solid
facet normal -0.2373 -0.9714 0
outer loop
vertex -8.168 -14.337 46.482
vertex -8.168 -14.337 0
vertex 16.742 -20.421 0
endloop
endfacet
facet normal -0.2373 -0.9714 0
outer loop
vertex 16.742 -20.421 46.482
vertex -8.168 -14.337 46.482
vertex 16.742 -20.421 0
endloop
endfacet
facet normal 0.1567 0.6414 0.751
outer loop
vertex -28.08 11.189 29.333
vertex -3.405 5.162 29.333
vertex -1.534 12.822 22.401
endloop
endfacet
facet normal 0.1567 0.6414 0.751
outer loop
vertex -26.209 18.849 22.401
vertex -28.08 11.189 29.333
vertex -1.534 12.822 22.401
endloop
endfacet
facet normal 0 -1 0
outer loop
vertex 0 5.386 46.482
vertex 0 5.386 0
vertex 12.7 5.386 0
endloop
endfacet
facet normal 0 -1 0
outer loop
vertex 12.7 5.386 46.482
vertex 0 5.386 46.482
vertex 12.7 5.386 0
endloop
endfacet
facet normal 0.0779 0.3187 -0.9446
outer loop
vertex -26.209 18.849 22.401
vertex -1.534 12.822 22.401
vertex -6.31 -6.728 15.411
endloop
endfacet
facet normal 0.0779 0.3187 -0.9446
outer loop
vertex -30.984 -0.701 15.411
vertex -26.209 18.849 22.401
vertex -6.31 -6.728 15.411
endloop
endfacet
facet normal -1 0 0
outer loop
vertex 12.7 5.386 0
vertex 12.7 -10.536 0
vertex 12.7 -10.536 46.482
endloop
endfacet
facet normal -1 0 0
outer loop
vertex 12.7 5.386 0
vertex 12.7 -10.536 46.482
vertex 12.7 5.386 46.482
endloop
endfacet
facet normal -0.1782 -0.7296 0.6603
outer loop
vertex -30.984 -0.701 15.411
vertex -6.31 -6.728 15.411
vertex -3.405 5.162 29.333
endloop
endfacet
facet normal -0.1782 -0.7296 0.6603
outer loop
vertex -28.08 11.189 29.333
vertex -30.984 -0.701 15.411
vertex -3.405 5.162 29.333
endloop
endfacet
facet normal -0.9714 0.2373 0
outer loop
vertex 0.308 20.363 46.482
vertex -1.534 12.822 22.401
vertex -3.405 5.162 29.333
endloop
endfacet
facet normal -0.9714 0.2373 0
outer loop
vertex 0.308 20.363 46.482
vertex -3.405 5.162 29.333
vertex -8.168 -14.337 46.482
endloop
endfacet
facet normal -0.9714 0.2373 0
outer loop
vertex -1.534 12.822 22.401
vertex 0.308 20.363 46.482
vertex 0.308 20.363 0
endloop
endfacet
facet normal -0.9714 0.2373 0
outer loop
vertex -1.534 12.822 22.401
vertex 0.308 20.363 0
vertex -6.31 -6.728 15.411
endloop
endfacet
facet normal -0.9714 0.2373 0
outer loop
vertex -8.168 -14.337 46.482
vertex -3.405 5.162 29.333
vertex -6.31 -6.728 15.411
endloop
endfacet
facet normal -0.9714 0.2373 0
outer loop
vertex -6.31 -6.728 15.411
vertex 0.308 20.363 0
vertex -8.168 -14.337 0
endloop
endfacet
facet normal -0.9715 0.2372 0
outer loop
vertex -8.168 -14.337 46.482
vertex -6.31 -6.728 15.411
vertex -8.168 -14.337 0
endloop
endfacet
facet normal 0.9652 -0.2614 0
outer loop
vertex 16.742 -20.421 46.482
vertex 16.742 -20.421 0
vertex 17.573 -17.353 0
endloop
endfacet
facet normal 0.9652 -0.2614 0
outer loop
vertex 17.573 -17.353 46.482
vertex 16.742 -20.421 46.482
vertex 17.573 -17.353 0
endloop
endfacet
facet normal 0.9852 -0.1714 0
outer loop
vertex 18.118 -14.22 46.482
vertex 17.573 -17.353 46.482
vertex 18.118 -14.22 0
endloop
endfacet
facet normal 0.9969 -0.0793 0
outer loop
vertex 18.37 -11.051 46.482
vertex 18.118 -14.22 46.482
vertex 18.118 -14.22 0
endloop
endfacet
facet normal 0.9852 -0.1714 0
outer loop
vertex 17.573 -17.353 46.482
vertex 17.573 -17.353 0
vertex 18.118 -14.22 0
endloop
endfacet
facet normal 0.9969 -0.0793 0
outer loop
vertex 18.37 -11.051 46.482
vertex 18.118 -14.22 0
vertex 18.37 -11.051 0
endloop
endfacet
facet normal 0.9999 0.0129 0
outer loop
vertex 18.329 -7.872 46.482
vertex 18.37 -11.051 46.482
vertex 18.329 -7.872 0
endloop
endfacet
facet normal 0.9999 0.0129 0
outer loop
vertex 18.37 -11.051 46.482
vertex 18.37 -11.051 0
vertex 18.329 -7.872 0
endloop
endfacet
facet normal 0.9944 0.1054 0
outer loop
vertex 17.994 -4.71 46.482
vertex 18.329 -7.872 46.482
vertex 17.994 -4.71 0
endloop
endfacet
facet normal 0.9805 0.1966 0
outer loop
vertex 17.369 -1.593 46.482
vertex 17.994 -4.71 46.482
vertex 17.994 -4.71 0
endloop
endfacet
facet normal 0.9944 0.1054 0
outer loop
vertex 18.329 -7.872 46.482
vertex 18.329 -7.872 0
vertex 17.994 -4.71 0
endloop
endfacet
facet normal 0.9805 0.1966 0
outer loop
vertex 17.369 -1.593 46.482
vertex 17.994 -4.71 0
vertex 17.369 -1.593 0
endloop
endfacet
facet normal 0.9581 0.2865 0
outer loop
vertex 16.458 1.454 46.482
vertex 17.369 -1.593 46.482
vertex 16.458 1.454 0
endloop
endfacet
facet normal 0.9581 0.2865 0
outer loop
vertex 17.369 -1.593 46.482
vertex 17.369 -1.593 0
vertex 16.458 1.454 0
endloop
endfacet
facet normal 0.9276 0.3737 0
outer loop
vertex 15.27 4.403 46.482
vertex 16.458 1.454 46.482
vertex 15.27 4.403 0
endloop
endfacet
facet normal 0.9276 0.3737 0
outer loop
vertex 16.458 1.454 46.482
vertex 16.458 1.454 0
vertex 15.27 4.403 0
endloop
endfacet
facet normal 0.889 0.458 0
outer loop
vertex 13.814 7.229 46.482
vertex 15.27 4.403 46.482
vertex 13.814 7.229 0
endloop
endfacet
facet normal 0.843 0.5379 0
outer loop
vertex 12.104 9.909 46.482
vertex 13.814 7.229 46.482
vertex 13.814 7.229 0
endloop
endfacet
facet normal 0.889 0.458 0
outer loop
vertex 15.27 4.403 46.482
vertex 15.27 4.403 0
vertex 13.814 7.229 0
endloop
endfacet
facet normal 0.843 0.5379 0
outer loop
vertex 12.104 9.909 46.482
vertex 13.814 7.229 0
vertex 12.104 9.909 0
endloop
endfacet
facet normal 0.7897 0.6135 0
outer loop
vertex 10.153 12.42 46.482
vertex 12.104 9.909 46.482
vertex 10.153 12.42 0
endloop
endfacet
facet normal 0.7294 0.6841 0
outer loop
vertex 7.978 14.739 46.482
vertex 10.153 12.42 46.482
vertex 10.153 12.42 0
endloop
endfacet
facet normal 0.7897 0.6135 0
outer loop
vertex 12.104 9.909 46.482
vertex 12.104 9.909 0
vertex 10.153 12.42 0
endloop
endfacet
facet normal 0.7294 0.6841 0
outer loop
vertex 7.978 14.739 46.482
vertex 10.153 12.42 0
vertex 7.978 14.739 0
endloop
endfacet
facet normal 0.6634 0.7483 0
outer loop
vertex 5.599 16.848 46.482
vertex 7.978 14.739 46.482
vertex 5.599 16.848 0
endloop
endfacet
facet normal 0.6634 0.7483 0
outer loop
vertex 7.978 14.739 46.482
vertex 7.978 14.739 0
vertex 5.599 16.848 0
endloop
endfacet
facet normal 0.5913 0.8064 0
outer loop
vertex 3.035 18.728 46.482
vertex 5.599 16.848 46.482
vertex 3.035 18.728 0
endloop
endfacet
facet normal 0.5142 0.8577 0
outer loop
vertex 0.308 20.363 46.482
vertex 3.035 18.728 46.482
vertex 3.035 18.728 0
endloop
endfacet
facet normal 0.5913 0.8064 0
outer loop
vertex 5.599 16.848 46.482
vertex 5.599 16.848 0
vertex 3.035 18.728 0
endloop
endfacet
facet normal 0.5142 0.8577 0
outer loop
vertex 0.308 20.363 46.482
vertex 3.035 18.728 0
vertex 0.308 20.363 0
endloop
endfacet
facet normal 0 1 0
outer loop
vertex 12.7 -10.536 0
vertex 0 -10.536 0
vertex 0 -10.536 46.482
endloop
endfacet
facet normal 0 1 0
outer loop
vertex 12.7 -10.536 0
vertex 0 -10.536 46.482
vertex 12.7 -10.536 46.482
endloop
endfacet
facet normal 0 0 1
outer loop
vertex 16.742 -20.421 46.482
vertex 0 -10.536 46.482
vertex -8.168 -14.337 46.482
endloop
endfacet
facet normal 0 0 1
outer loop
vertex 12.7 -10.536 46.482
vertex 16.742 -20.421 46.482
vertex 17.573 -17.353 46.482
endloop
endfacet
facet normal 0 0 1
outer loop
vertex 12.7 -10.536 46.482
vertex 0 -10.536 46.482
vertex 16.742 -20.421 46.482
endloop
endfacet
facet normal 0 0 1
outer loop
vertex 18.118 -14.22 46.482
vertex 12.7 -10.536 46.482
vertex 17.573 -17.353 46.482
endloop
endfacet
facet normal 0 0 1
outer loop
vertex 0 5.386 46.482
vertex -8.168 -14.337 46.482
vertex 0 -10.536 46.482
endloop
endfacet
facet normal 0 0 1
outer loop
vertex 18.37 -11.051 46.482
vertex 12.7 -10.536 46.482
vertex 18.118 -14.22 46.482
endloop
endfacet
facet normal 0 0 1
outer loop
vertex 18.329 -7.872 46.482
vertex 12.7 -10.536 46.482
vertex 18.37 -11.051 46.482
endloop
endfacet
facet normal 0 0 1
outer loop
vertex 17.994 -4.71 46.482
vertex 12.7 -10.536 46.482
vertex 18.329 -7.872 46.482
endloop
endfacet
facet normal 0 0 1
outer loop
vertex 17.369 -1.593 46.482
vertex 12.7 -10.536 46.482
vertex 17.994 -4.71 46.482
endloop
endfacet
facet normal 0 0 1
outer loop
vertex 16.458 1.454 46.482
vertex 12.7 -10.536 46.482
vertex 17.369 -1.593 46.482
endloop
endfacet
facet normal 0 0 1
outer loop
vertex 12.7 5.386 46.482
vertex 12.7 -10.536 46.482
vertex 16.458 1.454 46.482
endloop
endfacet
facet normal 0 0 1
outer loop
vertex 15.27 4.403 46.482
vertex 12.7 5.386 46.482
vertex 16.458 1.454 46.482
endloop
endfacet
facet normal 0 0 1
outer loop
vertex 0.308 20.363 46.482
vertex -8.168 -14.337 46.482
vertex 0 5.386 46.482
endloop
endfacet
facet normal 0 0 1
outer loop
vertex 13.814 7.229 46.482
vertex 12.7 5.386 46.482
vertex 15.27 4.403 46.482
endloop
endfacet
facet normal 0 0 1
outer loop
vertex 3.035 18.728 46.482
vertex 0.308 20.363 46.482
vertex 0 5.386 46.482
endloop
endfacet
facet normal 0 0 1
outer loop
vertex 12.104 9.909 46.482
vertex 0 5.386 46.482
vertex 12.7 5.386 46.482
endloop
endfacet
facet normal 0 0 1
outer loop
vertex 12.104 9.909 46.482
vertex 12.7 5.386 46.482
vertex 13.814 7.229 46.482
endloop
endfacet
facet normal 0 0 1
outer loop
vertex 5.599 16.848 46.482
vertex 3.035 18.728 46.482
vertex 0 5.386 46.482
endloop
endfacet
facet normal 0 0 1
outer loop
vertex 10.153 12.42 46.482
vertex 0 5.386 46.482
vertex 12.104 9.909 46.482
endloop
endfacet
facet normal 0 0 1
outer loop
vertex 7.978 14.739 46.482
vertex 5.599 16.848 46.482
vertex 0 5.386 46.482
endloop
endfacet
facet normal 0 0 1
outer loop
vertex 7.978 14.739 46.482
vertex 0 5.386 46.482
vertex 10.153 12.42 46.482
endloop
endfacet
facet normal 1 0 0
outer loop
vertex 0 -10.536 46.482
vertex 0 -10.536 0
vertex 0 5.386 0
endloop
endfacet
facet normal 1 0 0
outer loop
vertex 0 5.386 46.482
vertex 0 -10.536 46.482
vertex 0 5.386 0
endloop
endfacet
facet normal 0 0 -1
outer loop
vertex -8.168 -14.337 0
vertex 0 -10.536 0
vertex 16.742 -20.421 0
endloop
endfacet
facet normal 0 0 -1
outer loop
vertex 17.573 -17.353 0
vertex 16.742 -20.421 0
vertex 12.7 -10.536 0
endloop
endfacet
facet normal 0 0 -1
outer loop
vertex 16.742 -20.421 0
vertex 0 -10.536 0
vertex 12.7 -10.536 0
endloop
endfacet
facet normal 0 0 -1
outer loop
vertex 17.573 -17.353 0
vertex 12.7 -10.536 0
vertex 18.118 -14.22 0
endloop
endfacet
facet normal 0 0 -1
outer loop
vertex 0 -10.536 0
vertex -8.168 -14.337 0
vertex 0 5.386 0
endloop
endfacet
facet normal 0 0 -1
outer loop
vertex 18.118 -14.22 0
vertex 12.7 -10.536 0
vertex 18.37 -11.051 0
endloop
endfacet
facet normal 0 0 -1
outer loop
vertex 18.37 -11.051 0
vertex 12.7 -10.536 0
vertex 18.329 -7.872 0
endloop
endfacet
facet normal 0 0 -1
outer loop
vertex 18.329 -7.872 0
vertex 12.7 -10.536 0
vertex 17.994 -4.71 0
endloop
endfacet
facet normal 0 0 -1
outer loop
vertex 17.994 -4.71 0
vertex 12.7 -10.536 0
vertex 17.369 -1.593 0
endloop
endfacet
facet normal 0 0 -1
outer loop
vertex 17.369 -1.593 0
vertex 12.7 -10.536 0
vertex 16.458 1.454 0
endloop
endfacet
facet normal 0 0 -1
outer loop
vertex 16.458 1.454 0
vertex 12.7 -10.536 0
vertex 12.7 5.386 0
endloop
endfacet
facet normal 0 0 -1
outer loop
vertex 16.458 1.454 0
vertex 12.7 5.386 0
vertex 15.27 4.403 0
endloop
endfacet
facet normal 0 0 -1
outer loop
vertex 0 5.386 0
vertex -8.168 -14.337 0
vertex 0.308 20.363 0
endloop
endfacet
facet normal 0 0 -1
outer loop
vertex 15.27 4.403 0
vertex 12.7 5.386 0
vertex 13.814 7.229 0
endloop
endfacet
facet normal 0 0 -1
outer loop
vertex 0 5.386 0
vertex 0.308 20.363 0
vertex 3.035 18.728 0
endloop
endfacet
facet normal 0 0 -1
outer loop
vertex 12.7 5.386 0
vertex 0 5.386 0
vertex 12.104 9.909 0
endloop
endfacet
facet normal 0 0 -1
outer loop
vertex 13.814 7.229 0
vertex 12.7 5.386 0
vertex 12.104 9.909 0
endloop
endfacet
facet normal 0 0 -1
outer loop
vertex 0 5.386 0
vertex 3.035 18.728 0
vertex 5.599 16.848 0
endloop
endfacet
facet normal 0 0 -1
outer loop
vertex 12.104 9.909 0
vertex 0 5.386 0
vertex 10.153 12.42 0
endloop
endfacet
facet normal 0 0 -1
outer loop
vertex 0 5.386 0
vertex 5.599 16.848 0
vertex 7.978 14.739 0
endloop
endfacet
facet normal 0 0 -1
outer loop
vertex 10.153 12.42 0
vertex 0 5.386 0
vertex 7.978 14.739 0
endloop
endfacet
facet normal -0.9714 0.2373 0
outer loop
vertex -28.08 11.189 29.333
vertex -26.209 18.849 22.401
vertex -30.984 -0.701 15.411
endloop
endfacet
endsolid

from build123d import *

# Parameters (mm, degrees)
F0_W     = 12.7
F0_H     = 15.9213780425
F1_DEPTH = 46.482
F3_DEPTH = 25.4


with BuildPart() as f1:
    # F0 (on Top) → F1 (new body)
    with BuildSketch(Plane.XY):
        with BuildLine():
            ThreePointArc((16.7416256447, -20.4212910858), (15.8982302722, 2.9417746338), (0.3078590999, 20.3625806509))
            Line((0.3078590999, 20.3625806509), (-8.168171327, -14.3365160608))
            Line((-8.168171327, -14.3365160608), (16.7416256447, -20.4212910858))
        make_face()
        with Locations((6.35, -2.5750233326)):
            Rectangle(F0_W, F0_H, mode=Mode.SUBTRACT)
    extrude(amount=F1_DEPTH)

    # F2 (on face) → F3 (join)
    with BuildSketch(Plane(origin=(-4.40340964, 1.0756312881, 0), x_dir=(-0.2372953486, -0.9714375521, 0), z_dir=(-0.9714375521, 0.2372953486, 0))):
        Polygon((8.0335900158, 15.4112059095), (-4.2063454166, 29.3332058936), (-12.0916292071, 22.4006269127), align=None)
    extrude(amount=F3_DEPTH)


solid = f1.part
